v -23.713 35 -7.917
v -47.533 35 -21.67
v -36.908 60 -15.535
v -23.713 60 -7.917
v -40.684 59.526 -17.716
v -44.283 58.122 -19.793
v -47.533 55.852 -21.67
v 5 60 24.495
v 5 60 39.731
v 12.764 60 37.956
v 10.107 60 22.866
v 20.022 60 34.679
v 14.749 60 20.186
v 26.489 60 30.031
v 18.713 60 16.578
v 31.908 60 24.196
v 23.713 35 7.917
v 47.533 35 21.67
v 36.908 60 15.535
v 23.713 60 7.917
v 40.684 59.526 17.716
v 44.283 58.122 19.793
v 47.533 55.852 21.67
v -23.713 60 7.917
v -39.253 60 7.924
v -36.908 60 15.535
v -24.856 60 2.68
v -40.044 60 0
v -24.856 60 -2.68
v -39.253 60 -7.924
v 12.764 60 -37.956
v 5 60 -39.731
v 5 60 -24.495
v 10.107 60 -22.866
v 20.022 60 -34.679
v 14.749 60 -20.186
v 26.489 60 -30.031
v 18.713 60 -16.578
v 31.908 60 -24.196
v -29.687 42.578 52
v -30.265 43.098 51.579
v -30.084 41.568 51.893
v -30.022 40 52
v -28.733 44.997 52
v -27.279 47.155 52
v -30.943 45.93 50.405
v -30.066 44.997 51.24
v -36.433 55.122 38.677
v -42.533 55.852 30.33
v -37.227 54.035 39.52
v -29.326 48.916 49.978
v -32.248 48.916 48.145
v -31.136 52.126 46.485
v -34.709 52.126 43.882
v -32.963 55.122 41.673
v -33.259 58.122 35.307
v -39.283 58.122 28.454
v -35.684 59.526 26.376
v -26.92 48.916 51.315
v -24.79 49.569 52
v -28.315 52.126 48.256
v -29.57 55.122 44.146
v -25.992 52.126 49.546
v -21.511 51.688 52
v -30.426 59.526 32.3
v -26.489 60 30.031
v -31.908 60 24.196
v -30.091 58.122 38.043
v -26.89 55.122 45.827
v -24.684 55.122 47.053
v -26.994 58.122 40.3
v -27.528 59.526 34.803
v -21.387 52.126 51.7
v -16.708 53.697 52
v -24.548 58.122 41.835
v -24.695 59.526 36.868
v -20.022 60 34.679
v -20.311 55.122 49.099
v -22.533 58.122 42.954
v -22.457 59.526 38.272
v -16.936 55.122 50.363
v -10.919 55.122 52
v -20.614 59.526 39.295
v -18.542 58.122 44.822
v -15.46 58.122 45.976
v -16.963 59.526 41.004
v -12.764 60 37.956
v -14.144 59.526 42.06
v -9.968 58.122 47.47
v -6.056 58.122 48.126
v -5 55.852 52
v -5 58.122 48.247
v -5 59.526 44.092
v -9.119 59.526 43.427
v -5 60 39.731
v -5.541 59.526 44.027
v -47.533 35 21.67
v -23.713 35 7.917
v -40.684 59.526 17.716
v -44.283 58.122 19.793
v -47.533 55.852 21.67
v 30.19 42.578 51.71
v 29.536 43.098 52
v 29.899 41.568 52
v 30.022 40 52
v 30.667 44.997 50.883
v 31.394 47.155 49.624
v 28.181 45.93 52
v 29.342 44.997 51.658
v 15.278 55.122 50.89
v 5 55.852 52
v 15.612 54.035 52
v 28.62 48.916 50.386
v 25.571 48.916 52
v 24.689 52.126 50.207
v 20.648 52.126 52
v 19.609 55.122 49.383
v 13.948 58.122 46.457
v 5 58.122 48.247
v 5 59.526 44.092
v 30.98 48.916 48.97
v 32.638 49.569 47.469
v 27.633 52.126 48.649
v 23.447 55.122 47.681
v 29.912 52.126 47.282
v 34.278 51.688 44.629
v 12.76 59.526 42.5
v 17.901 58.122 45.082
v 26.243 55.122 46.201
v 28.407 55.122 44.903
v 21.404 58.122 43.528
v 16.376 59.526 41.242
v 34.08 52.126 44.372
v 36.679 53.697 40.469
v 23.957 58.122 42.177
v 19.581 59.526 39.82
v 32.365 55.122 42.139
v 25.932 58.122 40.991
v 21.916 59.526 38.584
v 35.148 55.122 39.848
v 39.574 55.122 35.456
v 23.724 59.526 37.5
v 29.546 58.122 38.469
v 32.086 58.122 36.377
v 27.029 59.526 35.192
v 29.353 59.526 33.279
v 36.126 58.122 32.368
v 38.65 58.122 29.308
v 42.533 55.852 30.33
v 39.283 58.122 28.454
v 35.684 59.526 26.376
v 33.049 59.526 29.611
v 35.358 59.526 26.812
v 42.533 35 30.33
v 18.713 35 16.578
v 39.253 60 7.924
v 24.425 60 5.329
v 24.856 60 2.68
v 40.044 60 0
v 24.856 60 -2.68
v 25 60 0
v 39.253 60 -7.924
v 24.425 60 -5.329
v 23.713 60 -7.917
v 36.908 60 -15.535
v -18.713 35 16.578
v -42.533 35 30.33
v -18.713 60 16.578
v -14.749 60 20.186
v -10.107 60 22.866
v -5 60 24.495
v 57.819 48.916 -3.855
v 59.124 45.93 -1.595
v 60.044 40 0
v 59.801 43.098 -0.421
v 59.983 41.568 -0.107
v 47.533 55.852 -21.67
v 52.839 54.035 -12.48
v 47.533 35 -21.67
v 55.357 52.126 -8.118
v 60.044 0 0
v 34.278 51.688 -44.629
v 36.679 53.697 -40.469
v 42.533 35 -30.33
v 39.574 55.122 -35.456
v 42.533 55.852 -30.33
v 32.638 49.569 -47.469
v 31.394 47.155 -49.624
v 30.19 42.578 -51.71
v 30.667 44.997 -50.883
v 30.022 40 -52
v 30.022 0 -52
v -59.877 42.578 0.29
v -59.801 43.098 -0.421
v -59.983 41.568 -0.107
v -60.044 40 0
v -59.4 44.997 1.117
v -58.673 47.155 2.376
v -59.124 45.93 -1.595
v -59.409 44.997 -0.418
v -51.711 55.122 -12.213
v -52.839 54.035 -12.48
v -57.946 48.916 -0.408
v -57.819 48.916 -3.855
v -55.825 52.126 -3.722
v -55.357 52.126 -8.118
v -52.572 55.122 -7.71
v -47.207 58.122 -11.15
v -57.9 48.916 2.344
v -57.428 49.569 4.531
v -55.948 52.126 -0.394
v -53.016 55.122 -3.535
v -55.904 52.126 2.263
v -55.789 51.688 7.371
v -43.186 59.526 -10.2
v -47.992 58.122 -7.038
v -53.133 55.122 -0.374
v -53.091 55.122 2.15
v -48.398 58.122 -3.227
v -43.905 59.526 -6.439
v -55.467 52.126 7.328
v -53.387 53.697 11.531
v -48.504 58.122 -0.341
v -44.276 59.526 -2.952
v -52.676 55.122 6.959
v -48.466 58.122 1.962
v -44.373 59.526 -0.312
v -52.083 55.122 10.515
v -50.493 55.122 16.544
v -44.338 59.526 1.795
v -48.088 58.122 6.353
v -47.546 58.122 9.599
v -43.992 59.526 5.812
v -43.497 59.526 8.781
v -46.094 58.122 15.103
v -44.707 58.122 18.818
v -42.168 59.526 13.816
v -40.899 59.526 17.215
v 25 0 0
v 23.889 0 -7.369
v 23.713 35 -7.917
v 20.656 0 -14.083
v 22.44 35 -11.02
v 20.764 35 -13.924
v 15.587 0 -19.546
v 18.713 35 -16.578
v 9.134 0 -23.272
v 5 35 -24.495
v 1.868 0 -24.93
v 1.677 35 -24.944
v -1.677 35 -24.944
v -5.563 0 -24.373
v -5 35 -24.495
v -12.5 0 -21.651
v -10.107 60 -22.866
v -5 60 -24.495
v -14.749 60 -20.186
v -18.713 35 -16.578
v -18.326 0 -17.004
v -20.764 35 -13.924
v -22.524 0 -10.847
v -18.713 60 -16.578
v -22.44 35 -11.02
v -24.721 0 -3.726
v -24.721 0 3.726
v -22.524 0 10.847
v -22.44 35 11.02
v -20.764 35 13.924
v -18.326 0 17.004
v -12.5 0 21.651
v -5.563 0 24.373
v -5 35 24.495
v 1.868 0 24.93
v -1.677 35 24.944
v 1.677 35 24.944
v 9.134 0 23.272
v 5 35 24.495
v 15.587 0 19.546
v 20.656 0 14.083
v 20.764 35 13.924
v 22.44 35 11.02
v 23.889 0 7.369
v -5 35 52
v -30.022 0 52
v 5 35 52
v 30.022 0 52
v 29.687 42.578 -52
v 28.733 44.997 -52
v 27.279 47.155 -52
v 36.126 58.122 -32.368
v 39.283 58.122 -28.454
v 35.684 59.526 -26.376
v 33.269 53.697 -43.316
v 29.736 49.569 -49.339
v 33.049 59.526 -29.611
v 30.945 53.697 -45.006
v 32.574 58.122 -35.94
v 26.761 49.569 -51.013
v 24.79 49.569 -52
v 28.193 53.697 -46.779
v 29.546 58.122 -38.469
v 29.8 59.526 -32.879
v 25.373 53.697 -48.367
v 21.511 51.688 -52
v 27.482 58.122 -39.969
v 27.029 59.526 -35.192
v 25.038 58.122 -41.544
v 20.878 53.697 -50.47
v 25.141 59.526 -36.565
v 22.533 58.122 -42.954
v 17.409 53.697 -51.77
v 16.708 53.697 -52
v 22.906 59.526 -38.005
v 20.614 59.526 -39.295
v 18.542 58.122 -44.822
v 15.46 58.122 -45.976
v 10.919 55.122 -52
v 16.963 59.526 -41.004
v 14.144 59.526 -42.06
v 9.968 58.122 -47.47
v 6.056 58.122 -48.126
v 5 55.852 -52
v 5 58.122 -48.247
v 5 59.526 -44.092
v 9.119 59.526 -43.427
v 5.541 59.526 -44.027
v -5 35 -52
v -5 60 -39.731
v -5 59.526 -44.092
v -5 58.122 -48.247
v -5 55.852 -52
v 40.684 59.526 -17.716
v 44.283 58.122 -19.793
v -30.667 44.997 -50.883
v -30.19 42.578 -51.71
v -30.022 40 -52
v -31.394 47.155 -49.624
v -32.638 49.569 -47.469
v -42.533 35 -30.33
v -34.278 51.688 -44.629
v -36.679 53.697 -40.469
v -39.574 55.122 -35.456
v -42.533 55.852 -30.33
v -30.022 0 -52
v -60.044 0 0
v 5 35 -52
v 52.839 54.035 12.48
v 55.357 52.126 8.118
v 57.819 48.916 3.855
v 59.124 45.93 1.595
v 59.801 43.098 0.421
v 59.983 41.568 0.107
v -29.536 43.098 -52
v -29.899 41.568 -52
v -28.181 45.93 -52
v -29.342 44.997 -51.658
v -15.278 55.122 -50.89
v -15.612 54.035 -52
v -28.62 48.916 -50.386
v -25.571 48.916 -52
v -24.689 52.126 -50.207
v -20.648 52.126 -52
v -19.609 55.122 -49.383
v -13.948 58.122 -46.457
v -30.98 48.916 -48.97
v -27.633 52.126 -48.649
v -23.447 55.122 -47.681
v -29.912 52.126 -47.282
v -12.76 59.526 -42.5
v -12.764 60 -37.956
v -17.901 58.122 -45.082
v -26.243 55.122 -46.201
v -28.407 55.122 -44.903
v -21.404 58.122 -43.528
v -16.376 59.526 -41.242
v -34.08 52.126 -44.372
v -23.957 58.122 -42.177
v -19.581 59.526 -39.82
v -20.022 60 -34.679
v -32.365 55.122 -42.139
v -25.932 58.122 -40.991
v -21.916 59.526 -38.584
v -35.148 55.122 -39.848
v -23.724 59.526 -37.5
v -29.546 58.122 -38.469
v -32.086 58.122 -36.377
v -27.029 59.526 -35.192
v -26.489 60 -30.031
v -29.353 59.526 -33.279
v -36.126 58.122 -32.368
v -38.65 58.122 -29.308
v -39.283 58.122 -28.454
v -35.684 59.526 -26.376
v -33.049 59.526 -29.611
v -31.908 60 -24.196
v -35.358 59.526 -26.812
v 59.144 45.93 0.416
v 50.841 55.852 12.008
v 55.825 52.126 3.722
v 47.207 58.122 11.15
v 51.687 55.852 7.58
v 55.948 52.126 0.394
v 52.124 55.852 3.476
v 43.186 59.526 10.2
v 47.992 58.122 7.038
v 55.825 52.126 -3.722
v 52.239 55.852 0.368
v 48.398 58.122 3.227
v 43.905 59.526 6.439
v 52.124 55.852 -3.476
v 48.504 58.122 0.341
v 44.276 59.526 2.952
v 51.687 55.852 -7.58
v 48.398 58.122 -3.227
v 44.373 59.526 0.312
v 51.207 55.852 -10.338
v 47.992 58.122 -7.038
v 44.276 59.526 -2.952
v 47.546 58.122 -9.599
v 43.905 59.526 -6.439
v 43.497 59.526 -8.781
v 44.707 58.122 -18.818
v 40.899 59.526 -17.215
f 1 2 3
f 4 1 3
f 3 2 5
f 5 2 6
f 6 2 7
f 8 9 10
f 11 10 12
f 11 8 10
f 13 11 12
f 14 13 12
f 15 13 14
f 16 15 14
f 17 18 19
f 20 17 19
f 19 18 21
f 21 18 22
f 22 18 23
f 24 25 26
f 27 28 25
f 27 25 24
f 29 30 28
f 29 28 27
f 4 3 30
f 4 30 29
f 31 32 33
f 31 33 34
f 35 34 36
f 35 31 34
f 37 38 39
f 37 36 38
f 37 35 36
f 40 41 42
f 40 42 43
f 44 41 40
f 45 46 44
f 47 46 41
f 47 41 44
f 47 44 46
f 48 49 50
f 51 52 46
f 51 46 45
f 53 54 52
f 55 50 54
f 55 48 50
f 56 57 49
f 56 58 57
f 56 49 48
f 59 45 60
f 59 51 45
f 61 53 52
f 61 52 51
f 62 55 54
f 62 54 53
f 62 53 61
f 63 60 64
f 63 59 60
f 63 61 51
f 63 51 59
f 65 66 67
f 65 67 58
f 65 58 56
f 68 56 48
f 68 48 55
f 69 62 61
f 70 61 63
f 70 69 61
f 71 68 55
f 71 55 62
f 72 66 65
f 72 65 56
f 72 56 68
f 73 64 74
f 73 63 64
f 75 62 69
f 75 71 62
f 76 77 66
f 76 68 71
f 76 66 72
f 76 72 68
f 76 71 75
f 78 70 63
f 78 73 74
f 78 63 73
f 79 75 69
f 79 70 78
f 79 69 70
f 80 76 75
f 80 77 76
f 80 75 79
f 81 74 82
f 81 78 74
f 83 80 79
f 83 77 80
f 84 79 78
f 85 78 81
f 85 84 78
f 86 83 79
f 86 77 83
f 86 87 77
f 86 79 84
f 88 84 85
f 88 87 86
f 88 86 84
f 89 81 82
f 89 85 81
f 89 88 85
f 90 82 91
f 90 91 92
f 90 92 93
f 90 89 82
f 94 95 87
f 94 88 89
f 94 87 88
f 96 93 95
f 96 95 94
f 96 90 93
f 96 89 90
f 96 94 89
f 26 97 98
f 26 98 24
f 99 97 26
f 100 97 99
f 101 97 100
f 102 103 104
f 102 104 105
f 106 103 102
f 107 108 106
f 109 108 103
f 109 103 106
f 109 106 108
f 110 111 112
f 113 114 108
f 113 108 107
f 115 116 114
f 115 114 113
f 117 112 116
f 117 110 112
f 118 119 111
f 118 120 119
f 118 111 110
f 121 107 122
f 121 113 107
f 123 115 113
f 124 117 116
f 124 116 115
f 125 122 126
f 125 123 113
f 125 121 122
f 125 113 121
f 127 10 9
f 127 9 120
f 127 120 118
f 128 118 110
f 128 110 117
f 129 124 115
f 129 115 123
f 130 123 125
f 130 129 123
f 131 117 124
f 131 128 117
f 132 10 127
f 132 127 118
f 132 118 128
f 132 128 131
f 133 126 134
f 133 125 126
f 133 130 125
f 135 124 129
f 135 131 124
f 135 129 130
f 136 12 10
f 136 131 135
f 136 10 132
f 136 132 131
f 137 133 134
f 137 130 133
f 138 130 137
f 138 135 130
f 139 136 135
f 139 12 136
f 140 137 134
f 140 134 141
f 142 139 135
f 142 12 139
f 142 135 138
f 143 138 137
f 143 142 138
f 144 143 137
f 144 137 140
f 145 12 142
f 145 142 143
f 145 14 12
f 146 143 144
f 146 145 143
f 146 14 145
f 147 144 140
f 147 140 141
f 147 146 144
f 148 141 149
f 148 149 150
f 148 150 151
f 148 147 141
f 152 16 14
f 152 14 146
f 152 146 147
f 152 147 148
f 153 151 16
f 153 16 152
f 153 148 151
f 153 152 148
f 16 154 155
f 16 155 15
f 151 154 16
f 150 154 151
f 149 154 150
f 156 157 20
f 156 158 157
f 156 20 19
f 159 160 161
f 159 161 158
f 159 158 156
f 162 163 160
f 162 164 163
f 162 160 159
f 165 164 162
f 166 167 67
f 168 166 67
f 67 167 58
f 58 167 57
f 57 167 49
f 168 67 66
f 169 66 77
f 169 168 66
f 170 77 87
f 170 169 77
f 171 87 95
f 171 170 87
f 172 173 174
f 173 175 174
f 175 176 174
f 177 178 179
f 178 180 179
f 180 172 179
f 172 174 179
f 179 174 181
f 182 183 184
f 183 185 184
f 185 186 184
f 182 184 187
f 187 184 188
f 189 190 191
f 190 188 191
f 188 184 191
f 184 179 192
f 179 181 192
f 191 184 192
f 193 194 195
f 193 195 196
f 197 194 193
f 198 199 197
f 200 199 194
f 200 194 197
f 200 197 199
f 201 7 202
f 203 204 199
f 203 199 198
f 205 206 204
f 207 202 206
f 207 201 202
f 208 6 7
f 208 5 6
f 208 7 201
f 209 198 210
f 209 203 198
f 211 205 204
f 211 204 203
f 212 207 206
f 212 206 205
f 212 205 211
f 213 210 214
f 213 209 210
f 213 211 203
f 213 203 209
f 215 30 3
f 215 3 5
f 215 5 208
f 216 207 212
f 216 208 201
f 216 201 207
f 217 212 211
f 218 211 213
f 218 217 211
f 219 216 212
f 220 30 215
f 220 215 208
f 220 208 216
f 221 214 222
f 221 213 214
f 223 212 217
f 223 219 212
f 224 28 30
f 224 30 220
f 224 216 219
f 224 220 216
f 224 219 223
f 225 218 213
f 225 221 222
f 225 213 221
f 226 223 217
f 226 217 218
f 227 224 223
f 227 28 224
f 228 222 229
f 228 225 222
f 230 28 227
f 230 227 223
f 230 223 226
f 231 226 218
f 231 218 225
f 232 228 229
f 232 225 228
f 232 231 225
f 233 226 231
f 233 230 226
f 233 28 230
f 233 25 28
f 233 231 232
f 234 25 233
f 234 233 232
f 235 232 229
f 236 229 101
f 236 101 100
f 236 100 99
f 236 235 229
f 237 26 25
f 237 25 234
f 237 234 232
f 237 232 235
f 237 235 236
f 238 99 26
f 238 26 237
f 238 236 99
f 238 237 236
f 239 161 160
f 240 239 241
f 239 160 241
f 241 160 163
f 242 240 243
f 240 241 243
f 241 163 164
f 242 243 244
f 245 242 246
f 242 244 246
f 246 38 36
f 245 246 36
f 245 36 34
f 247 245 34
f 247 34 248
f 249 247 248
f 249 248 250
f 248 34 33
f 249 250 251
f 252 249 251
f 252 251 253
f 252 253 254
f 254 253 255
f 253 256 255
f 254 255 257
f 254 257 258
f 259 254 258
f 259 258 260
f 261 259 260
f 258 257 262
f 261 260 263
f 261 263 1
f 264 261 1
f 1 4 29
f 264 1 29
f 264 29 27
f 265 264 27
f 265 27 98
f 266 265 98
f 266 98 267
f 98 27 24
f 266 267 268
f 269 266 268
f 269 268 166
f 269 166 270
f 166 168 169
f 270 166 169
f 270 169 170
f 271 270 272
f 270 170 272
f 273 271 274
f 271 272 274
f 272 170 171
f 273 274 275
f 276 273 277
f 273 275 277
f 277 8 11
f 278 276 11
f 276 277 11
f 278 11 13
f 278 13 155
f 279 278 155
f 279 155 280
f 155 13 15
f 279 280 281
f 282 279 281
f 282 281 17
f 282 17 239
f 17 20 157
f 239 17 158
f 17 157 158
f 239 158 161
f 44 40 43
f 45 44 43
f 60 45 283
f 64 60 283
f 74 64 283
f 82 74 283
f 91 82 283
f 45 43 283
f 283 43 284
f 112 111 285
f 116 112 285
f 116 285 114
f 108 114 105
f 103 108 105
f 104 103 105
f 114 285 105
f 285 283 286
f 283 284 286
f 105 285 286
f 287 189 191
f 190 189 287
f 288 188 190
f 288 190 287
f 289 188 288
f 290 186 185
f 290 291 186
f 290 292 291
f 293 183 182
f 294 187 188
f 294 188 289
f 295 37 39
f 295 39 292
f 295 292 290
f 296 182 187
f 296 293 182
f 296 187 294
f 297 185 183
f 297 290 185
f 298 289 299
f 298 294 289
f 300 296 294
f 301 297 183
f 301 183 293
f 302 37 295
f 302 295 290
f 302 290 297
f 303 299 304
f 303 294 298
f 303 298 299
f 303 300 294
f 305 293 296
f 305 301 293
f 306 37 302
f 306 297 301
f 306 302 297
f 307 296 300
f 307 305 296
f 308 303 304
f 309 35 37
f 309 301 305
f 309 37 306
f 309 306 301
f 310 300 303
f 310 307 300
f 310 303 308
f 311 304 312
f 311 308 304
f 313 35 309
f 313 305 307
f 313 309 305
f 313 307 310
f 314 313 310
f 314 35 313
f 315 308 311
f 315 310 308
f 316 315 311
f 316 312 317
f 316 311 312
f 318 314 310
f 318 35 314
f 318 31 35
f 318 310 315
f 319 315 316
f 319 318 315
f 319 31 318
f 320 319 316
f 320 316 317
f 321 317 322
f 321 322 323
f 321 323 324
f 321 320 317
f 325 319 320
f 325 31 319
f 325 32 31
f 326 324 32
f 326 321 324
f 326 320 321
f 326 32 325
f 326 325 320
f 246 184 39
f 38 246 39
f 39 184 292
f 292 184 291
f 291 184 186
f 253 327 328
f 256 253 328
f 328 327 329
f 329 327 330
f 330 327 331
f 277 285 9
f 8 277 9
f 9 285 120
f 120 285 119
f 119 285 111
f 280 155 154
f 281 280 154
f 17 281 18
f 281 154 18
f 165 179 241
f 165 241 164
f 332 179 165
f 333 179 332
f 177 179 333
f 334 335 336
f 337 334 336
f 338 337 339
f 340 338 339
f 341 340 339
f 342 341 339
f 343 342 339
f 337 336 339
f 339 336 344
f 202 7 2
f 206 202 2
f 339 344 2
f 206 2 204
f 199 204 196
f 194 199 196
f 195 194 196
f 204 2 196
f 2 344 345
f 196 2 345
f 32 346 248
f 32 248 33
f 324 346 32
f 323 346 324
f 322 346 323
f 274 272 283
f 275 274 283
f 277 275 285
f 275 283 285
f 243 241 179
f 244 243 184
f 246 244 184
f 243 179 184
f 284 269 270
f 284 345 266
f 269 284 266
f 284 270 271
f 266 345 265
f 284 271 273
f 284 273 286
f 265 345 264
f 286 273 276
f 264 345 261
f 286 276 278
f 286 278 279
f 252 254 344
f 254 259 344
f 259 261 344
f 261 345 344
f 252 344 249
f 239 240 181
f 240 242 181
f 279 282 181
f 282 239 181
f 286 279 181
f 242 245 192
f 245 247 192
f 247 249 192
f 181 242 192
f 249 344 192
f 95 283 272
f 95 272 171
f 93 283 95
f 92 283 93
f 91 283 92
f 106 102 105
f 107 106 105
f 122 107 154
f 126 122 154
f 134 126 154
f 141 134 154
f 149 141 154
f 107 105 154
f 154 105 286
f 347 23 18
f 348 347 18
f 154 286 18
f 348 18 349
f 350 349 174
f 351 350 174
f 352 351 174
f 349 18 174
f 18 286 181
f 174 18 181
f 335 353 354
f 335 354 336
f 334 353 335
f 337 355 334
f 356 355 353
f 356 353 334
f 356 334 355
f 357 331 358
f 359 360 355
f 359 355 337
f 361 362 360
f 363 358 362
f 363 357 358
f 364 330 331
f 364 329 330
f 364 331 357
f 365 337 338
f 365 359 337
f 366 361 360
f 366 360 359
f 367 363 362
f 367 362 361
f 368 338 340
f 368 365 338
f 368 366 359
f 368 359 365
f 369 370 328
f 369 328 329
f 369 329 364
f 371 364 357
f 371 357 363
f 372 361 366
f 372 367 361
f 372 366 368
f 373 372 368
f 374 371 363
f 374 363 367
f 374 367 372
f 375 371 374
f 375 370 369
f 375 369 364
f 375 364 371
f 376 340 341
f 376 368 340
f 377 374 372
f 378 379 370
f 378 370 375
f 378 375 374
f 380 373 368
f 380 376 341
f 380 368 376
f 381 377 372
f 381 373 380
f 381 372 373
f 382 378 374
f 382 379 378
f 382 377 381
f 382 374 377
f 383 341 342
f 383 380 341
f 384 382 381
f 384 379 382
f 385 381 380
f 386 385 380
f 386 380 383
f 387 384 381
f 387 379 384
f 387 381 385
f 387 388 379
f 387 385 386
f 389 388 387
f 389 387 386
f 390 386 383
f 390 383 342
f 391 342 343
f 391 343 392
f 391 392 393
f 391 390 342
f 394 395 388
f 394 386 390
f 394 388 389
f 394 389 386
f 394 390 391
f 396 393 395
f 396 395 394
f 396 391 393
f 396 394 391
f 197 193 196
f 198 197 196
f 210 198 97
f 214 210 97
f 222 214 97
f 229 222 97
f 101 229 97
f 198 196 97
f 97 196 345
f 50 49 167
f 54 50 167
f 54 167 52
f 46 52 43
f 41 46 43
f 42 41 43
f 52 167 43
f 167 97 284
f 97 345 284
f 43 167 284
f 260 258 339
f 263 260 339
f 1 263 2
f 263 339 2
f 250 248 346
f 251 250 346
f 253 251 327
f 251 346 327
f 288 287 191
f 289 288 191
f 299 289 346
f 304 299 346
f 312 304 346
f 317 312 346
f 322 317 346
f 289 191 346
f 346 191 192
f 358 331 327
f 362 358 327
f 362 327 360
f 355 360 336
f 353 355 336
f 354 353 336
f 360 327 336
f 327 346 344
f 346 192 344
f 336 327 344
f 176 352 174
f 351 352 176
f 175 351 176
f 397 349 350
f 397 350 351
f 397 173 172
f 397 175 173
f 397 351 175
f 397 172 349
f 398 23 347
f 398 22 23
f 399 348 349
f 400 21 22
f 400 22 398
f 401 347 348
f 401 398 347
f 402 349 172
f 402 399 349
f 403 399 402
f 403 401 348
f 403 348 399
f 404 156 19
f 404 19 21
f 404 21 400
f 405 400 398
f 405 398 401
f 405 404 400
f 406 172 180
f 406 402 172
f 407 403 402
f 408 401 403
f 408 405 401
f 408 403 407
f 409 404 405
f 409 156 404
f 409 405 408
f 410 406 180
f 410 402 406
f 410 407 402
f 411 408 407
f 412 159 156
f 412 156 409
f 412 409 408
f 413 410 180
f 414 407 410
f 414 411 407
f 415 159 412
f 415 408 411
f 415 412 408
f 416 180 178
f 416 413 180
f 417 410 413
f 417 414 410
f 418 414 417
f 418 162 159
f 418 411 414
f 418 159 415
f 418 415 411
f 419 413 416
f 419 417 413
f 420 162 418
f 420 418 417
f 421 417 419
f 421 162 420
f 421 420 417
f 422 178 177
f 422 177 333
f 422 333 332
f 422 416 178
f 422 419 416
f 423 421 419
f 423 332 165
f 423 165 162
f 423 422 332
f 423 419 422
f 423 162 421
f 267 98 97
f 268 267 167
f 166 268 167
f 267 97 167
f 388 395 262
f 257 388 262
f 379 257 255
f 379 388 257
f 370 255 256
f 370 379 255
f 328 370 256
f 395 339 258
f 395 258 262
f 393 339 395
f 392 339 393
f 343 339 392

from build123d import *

# Parameters (mm, degrees)
BOSS_EXTRUDE1_DEPTH = 60
SKETCH2_R           = 25
CUT_EXTRUDE1_DEPTH  = 60
SKETCH3_W           = 10
SKETCH3_H           = 25
CUT_EXTRUDE2_DEPTH  = 40
CIRPATTERN1_COUNT   = 6


with BuildPart() as part:
    # Sketch1 → Boss-Extrude1 (new body)
    with BuildSketch(Plane(origin=(0, 0, 0), x_dir=(1, 0, 0), z_dir=(0, 1, 0))):
        Polygon((-60.044427996, 0), (-30.022213998, -52), (30.022213998, -52), (60.044427996, 0), (30.022213998, 52), (-30.022213998, 52), align=None)
    extrude(amount=BOSS_EXTRUDE1_DEPTH)

    # Sketch2 → Cut-Extrude1 (cut)
    with BuildSketch(Plane(origin=(0, 60, 0), x_dir=(1, 0, 0), z_dir=(0, 1, 0))):
        Circle(SKETCH2_R)
    extrude(amount=-CUT_EXTRUDE1_DEPTH, mode=Mode.SUBTRACT)

    # Sketch3 → Cut-Extrude2 (cut)
    with BuildSketch(Plane.XY.offset(52)):
        with Locations((0, 47.5)):
            Rectangle(SKETCH3_W, SKETCH3_H)
    cut_extrude2 = extrude(amount=-CUT_EXTRUDE2_DEPTH, mode=Mode.SUBTRACT)

    # CirPattern1: Cut-Extrude2 ×6 about axis
    cirpattern1_axis = Axis((0, 0, 0), (0, 1, 0))
    for i in range(1, CIRPATTERN1_COUNT):
        add(cut_extrude2.rotate(cirpattern1_axis, i * 360 / CIRPATTERN1_COUNT), mode=Mode.SUBTRACT)

    # Sketch4 → Cut-Revolve1 (revolve, cut)
    with BuildSketch(Plane.XY):
        with BuildLine():
            Line((40.044427996, 60), (60.044427996, 60))
            Line((60.044427996, 60), (60.044427996, 40))
            ThreePointArc((60.044427996, 40), (54.186563619, 54.142135624), (40.044427996, 60))
        make_face()
    revolve(axis=Axis((0, 0, 0), (0, 1, 0)), mode=Mode.SUBTRACT)


solid = part.part
